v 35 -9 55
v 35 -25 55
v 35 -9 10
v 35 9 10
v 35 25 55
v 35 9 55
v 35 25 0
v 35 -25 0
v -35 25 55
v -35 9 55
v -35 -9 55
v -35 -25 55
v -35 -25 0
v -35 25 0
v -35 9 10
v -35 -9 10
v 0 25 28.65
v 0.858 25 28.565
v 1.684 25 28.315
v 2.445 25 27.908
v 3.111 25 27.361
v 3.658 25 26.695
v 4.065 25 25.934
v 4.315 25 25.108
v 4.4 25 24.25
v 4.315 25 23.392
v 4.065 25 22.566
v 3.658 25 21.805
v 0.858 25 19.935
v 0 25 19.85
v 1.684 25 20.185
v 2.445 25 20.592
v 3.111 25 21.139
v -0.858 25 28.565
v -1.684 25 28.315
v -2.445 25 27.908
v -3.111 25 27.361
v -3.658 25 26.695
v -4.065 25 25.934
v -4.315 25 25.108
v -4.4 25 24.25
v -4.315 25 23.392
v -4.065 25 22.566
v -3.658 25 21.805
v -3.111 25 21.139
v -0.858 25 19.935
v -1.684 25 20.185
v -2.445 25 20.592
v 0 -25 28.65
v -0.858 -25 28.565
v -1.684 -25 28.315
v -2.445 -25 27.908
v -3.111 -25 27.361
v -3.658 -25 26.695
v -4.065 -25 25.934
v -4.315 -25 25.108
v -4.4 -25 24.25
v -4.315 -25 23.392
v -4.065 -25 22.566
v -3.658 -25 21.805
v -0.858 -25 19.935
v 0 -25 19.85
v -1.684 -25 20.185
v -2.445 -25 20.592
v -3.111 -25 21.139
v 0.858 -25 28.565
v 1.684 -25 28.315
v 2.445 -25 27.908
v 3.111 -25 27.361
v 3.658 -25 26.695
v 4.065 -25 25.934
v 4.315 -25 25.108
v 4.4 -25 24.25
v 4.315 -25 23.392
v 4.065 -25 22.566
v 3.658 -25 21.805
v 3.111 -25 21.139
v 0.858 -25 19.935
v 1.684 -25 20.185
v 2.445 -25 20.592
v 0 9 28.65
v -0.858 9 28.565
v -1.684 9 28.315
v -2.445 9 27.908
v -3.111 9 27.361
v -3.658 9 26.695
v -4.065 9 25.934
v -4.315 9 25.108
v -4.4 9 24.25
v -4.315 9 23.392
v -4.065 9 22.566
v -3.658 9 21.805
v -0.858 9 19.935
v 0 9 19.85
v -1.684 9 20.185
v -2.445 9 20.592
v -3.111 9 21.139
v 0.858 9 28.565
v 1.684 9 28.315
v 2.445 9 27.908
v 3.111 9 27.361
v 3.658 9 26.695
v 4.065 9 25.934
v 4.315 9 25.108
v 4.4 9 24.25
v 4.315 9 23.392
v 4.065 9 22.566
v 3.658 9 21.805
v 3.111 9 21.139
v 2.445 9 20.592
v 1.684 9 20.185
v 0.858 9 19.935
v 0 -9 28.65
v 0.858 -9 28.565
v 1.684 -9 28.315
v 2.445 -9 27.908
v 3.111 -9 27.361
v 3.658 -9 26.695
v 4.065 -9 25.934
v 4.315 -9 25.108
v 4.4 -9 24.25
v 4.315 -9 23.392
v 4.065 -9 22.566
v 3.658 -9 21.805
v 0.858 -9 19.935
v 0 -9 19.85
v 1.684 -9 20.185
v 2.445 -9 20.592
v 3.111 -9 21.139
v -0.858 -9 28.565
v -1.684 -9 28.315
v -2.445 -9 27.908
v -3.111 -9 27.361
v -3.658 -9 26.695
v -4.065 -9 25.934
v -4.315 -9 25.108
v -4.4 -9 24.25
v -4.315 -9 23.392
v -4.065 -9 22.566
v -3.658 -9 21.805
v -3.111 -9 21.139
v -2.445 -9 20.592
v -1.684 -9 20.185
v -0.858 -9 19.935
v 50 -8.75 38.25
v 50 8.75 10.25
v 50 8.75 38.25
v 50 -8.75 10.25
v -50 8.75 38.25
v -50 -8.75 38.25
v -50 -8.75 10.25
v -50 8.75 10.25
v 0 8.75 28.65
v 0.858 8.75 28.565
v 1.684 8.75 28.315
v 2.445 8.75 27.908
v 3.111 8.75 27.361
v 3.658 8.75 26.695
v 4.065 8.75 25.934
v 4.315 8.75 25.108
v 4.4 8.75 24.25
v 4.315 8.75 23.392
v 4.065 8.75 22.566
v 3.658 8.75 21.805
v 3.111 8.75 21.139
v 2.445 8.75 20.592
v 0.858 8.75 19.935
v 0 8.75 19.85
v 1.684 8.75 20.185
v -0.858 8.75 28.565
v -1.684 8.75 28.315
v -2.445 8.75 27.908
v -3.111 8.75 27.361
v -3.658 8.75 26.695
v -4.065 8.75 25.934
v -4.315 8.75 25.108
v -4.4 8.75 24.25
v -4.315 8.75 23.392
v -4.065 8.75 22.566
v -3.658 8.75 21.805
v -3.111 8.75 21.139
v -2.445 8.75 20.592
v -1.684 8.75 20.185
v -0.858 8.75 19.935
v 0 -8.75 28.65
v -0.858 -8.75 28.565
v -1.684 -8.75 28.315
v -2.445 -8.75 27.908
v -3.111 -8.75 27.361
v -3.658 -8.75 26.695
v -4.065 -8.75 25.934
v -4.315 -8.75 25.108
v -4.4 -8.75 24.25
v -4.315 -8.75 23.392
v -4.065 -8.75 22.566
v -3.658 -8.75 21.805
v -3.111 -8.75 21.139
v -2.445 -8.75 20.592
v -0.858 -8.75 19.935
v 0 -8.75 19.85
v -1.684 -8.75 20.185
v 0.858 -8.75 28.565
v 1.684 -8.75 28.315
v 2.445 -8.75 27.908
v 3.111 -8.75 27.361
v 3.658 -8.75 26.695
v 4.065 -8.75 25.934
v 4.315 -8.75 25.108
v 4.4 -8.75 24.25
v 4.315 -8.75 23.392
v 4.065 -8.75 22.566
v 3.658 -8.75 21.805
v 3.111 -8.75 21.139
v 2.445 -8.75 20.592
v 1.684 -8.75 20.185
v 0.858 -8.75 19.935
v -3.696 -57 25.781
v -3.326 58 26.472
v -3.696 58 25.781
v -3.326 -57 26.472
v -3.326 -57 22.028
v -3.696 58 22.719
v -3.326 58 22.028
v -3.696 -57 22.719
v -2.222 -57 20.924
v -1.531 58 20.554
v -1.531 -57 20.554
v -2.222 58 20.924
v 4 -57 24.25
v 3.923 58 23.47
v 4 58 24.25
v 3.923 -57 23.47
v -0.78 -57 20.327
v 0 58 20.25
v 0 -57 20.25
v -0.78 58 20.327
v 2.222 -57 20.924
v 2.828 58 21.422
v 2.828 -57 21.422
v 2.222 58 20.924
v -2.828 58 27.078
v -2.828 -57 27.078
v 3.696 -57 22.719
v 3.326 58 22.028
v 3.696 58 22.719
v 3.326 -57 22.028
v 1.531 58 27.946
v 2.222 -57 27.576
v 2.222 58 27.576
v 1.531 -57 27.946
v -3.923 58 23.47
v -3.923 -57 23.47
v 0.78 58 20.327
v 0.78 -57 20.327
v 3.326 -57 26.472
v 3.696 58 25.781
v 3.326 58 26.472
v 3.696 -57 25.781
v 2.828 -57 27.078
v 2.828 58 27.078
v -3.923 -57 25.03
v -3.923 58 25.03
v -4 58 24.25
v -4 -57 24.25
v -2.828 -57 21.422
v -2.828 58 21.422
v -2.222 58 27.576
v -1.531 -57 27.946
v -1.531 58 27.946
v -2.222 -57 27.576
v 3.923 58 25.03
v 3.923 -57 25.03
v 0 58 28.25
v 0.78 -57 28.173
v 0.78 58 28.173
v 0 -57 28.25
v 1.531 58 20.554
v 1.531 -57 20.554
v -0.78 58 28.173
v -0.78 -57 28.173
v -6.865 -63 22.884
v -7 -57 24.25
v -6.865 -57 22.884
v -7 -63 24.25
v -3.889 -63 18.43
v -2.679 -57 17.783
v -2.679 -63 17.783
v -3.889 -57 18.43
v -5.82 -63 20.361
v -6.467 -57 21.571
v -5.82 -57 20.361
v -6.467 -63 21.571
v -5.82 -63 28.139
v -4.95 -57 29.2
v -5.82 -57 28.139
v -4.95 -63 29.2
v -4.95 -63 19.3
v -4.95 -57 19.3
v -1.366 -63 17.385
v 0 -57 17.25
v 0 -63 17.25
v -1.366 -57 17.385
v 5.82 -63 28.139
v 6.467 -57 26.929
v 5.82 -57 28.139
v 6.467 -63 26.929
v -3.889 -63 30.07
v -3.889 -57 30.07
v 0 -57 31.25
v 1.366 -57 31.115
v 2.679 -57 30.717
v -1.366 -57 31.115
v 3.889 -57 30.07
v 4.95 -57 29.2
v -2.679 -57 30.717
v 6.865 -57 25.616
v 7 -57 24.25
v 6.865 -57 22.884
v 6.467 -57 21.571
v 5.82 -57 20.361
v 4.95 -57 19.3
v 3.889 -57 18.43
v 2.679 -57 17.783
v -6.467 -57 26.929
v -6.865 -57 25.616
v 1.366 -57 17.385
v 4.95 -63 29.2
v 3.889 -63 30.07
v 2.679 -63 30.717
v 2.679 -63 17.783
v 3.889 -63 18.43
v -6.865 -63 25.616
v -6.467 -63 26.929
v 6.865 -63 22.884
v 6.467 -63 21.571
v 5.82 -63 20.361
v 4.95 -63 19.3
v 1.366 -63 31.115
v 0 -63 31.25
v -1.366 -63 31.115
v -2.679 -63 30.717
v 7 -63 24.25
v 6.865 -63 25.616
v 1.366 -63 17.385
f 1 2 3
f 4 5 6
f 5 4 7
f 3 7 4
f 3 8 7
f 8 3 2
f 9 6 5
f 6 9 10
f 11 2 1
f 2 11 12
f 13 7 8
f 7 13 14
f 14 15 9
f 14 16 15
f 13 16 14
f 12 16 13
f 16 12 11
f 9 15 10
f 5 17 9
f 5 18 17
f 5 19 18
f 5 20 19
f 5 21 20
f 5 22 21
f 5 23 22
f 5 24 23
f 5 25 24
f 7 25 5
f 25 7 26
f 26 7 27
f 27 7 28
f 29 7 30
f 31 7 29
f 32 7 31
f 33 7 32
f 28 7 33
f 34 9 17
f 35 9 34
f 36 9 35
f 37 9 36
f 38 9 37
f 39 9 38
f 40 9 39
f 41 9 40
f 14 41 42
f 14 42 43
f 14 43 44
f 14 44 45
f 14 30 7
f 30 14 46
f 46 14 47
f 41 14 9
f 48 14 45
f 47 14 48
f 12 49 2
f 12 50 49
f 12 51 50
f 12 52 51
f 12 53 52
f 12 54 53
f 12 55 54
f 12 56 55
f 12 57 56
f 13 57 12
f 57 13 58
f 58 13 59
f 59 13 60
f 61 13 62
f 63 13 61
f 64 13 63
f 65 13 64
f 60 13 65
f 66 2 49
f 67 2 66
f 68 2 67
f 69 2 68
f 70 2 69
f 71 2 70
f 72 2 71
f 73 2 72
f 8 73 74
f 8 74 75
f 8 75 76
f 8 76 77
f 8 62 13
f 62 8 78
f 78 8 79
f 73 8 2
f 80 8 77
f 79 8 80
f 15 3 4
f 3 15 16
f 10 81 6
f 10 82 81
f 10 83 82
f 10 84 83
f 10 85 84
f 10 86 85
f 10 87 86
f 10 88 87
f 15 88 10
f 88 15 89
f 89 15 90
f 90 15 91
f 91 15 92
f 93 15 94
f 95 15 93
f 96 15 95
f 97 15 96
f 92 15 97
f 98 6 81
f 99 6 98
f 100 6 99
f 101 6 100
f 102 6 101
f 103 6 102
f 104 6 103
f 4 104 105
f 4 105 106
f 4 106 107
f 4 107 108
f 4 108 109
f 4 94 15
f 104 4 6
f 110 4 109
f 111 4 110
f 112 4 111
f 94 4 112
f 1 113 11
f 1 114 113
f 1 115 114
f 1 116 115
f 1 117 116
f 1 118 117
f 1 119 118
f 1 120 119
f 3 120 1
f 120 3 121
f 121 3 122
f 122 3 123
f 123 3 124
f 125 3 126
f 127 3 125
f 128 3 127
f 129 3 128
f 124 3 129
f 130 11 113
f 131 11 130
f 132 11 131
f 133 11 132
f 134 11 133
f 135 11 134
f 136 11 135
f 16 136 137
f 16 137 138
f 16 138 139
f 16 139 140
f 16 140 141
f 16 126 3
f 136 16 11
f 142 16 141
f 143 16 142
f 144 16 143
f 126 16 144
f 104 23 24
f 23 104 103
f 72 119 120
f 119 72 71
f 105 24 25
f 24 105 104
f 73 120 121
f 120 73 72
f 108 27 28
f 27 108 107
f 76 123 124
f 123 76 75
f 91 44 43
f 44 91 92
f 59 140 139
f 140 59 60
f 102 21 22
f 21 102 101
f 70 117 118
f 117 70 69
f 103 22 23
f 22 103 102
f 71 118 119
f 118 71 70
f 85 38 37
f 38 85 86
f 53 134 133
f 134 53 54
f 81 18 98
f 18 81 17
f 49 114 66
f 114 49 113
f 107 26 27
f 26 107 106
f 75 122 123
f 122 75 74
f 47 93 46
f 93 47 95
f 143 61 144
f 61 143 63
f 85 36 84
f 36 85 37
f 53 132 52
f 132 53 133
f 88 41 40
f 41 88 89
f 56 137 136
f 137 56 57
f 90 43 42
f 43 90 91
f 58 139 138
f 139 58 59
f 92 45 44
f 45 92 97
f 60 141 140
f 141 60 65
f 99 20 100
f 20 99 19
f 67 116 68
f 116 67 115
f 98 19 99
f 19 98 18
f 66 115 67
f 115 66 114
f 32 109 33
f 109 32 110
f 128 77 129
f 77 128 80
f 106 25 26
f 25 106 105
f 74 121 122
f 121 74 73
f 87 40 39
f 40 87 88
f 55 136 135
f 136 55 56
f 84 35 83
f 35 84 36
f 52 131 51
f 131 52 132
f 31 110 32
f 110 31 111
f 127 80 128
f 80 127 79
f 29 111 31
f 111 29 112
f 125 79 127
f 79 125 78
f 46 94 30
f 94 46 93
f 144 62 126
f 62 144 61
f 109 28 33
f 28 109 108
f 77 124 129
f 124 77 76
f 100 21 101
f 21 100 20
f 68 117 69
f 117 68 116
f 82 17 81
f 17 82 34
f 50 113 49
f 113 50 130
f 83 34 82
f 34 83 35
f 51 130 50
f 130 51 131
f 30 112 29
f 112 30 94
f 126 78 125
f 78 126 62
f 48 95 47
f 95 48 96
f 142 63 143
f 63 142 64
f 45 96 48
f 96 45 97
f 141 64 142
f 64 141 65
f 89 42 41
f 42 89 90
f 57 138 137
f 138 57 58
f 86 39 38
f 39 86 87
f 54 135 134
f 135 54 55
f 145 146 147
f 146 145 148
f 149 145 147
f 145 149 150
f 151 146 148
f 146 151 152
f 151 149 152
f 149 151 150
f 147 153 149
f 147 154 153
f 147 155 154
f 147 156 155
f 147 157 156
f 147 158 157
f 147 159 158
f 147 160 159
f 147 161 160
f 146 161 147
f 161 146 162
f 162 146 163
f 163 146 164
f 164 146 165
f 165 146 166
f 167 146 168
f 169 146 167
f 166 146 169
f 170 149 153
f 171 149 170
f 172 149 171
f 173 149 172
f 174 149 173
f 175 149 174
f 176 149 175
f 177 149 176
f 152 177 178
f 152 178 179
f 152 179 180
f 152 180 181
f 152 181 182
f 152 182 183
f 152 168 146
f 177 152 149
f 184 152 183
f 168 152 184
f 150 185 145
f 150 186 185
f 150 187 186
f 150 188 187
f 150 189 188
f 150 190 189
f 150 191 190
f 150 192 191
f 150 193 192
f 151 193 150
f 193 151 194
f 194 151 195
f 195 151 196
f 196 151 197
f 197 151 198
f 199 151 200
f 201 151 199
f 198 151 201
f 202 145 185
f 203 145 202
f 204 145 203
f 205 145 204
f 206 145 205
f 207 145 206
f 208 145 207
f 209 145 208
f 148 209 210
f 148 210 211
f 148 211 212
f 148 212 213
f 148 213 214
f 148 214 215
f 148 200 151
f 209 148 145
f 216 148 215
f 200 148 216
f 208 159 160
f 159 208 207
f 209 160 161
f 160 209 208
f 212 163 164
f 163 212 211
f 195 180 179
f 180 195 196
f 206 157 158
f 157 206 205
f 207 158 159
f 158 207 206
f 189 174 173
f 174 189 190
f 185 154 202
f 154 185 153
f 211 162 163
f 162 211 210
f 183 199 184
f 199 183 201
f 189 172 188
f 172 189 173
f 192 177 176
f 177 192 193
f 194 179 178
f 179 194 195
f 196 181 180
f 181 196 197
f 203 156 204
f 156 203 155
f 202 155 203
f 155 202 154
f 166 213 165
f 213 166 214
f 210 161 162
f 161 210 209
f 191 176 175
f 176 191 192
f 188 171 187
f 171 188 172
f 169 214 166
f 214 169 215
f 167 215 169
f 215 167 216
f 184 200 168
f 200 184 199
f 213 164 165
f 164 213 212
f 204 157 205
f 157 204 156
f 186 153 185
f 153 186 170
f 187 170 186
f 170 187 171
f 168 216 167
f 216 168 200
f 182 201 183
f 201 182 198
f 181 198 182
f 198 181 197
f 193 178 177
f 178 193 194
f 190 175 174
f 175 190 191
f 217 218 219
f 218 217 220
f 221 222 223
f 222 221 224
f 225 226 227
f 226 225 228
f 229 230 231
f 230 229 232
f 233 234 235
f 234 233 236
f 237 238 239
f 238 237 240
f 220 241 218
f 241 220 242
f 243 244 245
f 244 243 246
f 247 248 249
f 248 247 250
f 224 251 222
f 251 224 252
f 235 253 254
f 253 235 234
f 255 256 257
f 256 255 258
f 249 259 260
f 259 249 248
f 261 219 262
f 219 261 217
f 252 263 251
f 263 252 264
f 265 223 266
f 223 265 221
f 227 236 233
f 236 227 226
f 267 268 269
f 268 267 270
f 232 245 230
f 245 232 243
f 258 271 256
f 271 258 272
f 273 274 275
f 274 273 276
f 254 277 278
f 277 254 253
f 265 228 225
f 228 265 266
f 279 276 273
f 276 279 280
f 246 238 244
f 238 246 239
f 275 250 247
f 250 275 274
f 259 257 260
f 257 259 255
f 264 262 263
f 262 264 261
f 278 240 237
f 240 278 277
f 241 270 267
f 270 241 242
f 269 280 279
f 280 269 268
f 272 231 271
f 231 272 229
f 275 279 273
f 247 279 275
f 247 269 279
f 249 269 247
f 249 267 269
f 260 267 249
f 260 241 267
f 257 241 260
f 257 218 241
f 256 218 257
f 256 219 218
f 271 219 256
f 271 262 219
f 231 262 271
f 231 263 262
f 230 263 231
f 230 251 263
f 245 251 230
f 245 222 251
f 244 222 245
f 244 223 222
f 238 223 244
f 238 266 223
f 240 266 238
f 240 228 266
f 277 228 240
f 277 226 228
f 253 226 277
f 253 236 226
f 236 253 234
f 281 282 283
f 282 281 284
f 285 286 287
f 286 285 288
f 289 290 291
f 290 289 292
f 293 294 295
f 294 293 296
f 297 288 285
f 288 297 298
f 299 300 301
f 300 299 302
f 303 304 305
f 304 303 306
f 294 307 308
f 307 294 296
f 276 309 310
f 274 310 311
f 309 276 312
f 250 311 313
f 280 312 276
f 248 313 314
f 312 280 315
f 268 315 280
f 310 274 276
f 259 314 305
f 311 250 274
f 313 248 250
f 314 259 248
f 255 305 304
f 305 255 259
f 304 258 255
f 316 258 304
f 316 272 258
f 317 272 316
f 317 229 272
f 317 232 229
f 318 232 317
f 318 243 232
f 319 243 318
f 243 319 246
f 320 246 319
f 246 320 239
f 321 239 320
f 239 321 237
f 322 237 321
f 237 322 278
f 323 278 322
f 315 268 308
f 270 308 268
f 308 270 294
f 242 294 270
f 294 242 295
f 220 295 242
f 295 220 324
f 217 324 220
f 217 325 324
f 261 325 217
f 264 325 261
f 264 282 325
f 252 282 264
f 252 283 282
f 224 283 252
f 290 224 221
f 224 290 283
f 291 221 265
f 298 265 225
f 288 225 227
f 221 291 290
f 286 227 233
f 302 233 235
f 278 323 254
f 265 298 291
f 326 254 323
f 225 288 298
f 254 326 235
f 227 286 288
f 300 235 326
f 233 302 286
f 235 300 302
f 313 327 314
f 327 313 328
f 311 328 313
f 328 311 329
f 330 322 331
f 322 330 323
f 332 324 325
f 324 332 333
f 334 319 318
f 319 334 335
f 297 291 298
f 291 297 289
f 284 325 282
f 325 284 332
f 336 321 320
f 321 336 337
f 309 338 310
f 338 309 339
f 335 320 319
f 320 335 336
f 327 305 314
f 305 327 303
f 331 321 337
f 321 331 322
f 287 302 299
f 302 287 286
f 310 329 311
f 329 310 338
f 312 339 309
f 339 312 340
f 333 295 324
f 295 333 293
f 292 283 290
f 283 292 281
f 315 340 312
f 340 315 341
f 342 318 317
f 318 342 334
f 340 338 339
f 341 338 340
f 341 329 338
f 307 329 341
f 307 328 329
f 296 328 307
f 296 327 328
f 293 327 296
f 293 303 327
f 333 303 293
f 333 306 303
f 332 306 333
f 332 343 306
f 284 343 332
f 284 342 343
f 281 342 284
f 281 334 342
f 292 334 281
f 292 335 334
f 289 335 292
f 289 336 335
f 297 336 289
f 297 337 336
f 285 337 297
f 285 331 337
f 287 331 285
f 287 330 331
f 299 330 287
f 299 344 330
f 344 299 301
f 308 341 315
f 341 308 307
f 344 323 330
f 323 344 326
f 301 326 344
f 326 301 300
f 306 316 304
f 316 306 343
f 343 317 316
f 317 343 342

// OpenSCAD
$fn = 32;

// ------------------------------------------------------------------------
// Clevis joint: 70 mm clevis, pin d8
// Every part is its own module, assembly() places them once.
// ------------------------------------------------------------------------

// --- part 1 ---
module clevis() {
  difference() {
    translate([-35, -25, 0]) cube([70, 50, 55]);
    translate([-36, -9, 10]) cube([72, 18, 46]);
    translate([0, 0, 24.25]) rotate([90, 0, 0]) cylinder(h = 52, d = 8.8, center = true);
  }
}

// --- part 2 ---
module eye() {
  difference() {
    translate([-50, -8.75, 0]) cube([100, 17.5, 28]);
    translate([0, 0, 14]) rotate([90, 0, 0]) cylinder(h = 19.5, d = 8.8, center = true);
  }
}

// --- part 3 ---
module pin() {
  rotate([0, 90, 0]) cylinder(h = 116, d = 8, center = true);
  translate([-63, 0, 0]) rotate([0, 90, 0]) cylinder(h = 6, d = 14);
}

// --- assembly ---
module assembly() {
  translate([0, 0, 0]) rotate([0, 0, 0]) clevis();
  translate([0, 0, 10.25]) rotate([0, 0, 0]) eye();
  translate([0, 0, 24.25]) rotate([0, 0, 90]) pin();
}

assembly();
